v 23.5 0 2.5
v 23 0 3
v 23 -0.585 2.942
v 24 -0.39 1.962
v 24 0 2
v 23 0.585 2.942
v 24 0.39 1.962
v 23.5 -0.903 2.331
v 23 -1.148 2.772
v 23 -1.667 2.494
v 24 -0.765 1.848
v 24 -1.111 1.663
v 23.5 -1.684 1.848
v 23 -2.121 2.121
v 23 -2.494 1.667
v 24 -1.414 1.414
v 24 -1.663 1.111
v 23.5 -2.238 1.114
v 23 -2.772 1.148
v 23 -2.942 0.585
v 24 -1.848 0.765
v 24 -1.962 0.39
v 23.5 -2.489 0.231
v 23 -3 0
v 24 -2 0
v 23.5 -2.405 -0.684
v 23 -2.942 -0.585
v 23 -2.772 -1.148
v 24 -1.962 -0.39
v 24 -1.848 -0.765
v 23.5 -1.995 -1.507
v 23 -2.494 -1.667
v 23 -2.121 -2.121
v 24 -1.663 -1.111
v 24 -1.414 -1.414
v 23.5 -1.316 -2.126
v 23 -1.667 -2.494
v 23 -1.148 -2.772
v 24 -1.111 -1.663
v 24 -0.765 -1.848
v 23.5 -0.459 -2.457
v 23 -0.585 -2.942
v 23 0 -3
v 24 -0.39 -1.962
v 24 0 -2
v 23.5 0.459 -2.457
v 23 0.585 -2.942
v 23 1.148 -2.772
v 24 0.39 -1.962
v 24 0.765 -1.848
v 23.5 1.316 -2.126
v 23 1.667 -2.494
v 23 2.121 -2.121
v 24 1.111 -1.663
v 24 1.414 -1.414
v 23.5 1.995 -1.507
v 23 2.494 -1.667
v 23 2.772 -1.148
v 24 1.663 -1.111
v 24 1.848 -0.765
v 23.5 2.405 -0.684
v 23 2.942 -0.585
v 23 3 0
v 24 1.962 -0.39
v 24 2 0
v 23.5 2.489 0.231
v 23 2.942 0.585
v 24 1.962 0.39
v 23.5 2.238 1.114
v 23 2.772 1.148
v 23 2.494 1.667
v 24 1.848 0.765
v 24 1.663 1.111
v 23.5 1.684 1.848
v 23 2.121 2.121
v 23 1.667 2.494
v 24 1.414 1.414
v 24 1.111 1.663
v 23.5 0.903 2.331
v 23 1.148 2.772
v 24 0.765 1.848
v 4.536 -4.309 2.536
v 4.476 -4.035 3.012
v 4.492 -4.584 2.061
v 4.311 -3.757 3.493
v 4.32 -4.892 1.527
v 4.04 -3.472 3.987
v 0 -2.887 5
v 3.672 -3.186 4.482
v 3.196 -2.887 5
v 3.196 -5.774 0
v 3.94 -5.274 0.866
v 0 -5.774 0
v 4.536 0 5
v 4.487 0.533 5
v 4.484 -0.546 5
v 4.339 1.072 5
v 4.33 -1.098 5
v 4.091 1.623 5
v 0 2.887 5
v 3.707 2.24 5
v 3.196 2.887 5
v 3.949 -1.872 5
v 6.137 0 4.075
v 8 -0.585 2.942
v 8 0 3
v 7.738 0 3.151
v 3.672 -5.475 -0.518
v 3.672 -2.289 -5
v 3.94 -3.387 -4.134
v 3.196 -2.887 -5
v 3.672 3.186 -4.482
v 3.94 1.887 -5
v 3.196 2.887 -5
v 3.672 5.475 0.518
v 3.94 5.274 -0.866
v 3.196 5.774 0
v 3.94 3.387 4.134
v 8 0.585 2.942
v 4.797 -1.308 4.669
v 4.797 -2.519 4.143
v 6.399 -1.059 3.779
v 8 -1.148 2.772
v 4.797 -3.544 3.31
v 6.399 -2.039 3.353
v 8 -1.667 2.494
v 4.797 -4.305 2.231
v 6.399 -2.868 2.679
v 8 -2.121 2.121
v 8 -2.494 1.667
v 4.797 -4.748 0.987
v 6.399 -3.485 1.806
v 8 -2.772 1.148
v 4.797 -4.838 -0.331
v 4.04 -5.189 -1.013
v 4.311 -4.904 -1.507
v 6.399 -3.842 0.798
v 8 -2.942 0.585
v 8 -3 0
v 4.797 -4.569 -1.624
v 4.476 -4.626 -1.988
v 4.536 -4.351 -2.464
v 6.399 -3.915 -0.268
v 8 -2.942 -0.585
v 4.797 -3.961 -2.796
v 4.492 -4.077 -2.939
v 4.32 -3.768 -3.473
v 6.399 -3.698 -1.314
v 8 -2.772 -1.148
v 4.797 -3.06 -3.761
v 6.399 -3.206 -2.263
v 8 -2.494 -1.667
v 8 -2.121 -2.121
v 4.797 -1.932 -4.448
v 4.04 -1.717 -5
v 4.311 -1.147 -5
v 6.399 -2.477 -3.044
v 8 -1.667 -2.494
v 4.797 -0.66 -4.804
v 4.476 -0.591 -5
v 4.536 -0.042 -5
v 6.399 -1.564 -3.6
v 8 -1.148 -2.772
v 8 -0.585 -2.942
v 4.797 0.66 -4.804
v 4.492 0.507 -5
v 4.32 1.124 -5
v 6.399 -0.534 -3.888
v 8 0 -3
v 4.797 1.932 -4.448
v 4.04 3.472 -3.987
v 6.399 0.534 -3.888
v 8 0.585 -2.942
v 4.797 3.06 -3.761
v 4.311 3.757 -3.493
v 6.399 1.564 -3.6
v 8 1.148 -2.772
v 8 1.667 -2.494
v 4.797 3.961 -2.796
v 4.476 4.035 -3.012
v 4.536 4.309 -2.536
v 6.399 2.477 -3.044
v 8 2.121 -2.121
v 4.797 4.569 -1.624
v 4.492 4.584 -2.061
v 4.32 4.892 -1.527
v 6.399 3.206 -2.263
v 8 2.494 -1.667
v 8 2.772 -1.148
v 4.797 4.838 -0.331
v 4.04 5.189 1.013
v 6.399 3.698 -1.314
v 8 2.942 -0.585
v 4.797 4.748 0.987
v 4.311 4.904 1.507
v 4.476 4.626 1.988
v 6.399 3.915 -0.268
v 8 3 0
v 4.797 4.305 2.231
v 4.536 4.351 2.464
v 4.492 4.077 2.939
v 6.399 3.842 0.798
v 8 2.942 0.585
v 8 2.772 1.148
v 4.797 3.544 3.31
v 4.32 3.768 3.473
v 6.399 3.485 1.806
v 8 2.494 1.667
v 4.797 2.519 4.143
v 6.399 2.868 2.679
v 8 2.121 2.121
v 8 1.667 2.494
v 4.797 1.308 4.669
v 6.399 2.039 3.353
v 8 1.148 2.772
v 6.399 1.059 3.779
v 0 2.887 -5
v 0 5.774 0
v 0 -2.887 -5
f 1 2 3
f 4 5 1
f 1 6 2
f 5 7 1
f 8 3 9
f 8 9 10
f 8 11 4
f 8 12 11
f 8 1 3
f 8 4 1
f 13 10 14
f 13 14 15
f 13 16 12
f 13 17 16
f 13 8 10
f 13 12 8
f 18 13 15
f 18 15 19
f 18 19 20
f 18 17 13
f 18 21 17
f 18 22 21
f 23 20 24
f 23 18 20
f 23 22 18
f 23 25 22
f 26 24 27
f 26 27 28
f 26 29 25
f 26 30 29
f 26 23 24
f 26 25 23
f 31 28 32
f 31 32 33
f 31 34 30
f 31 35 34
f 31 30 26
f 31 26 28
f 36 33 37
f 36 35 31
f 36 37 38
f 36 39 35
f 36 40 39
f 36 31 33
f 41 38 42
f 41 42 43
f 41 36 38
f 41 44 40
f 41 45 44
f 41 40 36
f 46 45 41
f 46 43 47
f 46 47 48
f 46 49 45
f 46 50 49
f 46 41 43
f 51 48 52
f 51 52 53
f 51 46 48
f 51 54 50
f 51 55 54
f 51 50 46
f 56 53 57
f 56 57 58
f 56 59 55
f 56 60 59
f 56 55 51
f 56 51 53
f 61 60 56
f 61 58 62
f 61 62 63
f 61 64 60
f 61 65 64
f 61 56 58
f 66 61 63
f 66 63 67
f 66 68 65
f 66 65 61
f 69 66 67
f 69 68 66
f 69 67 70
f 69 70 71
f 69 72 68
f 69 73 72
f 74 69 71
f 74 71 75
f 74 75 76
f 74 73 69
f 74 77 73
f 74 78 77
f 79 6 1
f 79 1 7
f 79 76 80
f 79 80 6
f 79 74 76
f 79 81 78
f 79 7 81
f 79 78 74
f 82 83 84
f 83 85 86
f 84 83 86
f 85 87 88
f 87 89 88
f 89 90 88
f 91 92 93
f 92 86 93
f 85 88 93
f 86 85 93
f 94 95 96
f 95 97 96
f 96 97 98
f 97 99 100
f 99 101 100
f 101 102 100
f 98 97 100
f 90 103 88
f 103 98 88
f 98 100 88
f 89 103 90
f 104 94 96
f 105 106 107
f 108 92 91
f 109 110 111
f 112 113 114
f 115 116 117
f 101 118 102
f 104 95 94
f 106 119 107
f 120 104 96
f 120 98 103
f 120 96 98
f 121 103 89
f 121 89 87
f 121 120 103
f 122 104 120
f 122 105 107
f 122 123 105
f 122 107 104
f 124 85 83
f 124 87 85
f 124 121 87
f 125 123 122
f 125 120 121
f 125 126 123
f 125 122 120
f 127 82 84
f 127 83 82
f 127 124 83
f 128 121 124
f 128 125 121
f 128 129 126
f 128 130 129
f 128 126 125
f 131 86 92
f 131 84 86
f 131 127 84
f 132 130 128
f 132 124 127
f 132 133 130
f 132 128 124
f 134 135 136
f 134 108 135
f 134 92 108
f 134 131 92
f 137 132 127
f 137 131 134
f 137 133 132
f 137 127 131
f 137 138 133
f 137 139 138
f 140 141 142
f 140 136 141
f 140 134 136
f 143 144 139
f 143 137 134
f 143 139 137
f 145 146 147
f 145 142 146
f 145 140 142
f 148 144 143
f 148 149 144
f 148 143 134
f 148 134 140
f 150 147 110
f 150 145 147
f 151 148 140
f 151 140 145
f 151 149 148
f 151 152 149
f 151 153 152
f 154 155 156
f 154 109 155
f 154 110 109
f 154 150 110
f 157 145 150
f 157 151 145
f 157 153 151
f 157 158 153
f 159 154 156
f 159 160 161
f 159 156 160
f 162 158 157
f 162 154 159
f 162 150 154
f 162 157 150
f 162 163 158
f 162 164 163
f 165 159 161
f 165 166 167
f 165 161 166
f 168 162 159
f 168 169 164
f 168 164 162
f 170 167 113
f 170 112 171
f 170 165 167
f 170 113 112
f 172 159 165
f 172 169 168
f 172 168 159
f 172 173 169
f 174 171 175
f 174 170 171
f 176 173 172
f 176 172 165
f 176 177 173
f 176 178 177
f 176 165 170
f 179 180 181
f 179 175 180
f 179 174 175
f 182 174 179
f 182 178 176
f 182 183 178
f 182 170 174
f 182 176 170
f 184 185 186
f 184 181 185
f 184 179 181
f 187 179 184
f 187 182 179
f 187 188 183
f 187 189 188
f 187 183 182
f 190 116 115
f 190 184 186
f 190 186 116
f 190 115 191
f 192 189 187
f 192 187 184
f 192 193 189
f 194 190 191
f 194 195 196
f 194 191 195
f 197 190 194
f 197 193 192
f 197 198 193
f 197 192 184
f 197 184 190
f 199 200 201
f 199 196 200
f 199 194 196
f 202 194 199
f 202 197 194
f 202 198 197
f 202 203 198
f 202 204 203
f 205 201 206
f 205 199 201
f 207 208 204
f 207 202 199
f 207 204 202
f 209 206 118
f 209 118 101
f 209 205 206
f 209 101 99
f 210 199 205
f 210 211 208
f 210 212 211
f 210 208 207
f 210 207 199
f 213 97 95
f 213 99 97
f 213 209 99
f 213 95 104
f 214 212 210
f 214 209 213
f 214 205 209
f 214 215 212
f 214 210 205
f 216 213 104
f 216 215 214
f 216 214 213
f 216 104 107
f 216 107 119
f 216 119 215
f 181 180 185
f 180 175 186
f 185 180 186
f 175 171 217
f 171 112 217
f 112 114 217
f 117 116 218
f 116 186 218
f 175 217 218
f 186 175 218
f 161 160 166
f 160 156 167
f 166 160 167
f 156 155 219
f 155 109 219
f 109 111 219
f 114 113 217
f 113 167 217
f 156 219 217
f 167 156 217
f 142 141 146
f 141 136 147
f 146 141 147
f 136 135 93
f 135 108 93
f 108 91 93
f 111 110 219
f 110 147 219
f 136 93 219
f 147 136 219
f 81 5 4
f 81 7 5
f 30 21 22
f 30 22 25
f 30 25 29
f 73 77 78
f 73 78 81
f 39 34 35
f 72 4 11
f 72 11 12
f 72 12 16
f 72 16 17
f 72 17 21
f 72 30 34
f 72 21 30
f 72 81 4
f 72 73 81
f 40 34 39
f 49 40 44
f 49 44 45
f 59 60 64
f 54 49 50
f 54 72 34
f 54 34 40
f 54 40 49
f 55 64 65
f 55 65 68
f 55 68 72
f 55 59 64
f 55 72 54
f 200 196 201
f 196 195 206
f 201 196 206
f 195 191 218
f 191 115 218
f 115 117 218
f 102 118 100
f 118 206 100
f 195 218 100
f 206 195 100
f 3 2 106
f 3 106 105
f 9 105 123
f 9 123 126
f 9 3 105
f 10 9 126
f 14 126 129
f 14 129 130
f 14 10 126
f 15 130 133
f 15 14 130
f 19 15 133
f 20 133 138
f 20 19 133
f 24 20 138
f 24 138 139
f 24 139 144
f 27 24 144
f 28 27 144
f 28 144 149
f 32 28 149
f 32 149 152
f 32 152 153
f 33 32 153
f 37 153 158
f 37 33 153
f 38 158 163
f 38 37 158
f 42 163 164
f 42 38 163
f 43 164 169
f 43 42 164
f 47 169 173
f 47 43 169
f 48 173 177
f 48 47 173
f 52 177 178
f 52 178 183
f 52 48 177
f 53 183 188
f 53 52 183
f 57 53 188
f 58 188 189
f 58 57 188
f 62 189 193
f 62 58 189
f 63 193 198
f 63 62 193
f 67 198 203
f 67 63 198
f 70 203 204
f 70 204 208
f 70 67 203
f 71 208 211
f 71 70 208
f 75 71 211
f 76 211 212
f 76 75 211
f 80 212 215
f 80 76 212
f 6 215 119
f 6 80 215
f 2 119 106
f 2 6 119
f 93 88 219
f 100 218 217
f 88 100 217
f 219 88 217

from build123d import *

# Parameters (mm, degrees)
EXTRUDE_1_DEPTH = 24
CHAMFER_1_SIZE  = 1


with BuildPart() as part:
    # Эскиз1 → Бобышка-Вытянуть1 (new body)
    with BuildSketch(Plane(origin=(0, 0, 0), x_dir=(0, 0, -1), z_dir=(1, 0, 0))):
        Polygon((0, 5.773502692), (-5, 2.886751346), (-5, -2.886751346), (0, -5.773502692), (5, -2.886751346), (5, 2.886751346), align=None)
    extrude(amount=EXTRUDE_1_DEPTH)

    # Эскиз2 → Вырез-Повернуть1 (revolve, cut)
    with BuildSketch(Plane.XY, mode=Mode.PRIVATE) as cut_revolve_1_sk:
        Polygon((3.196152423, 5.773502692), (8, 3), (24, 3), (24, 5.773502692), align=None)
    revolve(cut_revolve_1_sk.sketch.rotate(Axis((0, 0, 0), (1, 0, 0)), 90), axis=Axis((0, 0, 0), (1, 0, 0)), mode=Mode.SUBTRACT)

    # Фаска1
    chamfer_1_edges = [part.edges().sort_by_distance(p)[0] for p in [
        (24, 0, -3),
    ]]
    chamfer(chamfer_1_edges, length=CHAMFER_1_SIZE)


solid = part.part
